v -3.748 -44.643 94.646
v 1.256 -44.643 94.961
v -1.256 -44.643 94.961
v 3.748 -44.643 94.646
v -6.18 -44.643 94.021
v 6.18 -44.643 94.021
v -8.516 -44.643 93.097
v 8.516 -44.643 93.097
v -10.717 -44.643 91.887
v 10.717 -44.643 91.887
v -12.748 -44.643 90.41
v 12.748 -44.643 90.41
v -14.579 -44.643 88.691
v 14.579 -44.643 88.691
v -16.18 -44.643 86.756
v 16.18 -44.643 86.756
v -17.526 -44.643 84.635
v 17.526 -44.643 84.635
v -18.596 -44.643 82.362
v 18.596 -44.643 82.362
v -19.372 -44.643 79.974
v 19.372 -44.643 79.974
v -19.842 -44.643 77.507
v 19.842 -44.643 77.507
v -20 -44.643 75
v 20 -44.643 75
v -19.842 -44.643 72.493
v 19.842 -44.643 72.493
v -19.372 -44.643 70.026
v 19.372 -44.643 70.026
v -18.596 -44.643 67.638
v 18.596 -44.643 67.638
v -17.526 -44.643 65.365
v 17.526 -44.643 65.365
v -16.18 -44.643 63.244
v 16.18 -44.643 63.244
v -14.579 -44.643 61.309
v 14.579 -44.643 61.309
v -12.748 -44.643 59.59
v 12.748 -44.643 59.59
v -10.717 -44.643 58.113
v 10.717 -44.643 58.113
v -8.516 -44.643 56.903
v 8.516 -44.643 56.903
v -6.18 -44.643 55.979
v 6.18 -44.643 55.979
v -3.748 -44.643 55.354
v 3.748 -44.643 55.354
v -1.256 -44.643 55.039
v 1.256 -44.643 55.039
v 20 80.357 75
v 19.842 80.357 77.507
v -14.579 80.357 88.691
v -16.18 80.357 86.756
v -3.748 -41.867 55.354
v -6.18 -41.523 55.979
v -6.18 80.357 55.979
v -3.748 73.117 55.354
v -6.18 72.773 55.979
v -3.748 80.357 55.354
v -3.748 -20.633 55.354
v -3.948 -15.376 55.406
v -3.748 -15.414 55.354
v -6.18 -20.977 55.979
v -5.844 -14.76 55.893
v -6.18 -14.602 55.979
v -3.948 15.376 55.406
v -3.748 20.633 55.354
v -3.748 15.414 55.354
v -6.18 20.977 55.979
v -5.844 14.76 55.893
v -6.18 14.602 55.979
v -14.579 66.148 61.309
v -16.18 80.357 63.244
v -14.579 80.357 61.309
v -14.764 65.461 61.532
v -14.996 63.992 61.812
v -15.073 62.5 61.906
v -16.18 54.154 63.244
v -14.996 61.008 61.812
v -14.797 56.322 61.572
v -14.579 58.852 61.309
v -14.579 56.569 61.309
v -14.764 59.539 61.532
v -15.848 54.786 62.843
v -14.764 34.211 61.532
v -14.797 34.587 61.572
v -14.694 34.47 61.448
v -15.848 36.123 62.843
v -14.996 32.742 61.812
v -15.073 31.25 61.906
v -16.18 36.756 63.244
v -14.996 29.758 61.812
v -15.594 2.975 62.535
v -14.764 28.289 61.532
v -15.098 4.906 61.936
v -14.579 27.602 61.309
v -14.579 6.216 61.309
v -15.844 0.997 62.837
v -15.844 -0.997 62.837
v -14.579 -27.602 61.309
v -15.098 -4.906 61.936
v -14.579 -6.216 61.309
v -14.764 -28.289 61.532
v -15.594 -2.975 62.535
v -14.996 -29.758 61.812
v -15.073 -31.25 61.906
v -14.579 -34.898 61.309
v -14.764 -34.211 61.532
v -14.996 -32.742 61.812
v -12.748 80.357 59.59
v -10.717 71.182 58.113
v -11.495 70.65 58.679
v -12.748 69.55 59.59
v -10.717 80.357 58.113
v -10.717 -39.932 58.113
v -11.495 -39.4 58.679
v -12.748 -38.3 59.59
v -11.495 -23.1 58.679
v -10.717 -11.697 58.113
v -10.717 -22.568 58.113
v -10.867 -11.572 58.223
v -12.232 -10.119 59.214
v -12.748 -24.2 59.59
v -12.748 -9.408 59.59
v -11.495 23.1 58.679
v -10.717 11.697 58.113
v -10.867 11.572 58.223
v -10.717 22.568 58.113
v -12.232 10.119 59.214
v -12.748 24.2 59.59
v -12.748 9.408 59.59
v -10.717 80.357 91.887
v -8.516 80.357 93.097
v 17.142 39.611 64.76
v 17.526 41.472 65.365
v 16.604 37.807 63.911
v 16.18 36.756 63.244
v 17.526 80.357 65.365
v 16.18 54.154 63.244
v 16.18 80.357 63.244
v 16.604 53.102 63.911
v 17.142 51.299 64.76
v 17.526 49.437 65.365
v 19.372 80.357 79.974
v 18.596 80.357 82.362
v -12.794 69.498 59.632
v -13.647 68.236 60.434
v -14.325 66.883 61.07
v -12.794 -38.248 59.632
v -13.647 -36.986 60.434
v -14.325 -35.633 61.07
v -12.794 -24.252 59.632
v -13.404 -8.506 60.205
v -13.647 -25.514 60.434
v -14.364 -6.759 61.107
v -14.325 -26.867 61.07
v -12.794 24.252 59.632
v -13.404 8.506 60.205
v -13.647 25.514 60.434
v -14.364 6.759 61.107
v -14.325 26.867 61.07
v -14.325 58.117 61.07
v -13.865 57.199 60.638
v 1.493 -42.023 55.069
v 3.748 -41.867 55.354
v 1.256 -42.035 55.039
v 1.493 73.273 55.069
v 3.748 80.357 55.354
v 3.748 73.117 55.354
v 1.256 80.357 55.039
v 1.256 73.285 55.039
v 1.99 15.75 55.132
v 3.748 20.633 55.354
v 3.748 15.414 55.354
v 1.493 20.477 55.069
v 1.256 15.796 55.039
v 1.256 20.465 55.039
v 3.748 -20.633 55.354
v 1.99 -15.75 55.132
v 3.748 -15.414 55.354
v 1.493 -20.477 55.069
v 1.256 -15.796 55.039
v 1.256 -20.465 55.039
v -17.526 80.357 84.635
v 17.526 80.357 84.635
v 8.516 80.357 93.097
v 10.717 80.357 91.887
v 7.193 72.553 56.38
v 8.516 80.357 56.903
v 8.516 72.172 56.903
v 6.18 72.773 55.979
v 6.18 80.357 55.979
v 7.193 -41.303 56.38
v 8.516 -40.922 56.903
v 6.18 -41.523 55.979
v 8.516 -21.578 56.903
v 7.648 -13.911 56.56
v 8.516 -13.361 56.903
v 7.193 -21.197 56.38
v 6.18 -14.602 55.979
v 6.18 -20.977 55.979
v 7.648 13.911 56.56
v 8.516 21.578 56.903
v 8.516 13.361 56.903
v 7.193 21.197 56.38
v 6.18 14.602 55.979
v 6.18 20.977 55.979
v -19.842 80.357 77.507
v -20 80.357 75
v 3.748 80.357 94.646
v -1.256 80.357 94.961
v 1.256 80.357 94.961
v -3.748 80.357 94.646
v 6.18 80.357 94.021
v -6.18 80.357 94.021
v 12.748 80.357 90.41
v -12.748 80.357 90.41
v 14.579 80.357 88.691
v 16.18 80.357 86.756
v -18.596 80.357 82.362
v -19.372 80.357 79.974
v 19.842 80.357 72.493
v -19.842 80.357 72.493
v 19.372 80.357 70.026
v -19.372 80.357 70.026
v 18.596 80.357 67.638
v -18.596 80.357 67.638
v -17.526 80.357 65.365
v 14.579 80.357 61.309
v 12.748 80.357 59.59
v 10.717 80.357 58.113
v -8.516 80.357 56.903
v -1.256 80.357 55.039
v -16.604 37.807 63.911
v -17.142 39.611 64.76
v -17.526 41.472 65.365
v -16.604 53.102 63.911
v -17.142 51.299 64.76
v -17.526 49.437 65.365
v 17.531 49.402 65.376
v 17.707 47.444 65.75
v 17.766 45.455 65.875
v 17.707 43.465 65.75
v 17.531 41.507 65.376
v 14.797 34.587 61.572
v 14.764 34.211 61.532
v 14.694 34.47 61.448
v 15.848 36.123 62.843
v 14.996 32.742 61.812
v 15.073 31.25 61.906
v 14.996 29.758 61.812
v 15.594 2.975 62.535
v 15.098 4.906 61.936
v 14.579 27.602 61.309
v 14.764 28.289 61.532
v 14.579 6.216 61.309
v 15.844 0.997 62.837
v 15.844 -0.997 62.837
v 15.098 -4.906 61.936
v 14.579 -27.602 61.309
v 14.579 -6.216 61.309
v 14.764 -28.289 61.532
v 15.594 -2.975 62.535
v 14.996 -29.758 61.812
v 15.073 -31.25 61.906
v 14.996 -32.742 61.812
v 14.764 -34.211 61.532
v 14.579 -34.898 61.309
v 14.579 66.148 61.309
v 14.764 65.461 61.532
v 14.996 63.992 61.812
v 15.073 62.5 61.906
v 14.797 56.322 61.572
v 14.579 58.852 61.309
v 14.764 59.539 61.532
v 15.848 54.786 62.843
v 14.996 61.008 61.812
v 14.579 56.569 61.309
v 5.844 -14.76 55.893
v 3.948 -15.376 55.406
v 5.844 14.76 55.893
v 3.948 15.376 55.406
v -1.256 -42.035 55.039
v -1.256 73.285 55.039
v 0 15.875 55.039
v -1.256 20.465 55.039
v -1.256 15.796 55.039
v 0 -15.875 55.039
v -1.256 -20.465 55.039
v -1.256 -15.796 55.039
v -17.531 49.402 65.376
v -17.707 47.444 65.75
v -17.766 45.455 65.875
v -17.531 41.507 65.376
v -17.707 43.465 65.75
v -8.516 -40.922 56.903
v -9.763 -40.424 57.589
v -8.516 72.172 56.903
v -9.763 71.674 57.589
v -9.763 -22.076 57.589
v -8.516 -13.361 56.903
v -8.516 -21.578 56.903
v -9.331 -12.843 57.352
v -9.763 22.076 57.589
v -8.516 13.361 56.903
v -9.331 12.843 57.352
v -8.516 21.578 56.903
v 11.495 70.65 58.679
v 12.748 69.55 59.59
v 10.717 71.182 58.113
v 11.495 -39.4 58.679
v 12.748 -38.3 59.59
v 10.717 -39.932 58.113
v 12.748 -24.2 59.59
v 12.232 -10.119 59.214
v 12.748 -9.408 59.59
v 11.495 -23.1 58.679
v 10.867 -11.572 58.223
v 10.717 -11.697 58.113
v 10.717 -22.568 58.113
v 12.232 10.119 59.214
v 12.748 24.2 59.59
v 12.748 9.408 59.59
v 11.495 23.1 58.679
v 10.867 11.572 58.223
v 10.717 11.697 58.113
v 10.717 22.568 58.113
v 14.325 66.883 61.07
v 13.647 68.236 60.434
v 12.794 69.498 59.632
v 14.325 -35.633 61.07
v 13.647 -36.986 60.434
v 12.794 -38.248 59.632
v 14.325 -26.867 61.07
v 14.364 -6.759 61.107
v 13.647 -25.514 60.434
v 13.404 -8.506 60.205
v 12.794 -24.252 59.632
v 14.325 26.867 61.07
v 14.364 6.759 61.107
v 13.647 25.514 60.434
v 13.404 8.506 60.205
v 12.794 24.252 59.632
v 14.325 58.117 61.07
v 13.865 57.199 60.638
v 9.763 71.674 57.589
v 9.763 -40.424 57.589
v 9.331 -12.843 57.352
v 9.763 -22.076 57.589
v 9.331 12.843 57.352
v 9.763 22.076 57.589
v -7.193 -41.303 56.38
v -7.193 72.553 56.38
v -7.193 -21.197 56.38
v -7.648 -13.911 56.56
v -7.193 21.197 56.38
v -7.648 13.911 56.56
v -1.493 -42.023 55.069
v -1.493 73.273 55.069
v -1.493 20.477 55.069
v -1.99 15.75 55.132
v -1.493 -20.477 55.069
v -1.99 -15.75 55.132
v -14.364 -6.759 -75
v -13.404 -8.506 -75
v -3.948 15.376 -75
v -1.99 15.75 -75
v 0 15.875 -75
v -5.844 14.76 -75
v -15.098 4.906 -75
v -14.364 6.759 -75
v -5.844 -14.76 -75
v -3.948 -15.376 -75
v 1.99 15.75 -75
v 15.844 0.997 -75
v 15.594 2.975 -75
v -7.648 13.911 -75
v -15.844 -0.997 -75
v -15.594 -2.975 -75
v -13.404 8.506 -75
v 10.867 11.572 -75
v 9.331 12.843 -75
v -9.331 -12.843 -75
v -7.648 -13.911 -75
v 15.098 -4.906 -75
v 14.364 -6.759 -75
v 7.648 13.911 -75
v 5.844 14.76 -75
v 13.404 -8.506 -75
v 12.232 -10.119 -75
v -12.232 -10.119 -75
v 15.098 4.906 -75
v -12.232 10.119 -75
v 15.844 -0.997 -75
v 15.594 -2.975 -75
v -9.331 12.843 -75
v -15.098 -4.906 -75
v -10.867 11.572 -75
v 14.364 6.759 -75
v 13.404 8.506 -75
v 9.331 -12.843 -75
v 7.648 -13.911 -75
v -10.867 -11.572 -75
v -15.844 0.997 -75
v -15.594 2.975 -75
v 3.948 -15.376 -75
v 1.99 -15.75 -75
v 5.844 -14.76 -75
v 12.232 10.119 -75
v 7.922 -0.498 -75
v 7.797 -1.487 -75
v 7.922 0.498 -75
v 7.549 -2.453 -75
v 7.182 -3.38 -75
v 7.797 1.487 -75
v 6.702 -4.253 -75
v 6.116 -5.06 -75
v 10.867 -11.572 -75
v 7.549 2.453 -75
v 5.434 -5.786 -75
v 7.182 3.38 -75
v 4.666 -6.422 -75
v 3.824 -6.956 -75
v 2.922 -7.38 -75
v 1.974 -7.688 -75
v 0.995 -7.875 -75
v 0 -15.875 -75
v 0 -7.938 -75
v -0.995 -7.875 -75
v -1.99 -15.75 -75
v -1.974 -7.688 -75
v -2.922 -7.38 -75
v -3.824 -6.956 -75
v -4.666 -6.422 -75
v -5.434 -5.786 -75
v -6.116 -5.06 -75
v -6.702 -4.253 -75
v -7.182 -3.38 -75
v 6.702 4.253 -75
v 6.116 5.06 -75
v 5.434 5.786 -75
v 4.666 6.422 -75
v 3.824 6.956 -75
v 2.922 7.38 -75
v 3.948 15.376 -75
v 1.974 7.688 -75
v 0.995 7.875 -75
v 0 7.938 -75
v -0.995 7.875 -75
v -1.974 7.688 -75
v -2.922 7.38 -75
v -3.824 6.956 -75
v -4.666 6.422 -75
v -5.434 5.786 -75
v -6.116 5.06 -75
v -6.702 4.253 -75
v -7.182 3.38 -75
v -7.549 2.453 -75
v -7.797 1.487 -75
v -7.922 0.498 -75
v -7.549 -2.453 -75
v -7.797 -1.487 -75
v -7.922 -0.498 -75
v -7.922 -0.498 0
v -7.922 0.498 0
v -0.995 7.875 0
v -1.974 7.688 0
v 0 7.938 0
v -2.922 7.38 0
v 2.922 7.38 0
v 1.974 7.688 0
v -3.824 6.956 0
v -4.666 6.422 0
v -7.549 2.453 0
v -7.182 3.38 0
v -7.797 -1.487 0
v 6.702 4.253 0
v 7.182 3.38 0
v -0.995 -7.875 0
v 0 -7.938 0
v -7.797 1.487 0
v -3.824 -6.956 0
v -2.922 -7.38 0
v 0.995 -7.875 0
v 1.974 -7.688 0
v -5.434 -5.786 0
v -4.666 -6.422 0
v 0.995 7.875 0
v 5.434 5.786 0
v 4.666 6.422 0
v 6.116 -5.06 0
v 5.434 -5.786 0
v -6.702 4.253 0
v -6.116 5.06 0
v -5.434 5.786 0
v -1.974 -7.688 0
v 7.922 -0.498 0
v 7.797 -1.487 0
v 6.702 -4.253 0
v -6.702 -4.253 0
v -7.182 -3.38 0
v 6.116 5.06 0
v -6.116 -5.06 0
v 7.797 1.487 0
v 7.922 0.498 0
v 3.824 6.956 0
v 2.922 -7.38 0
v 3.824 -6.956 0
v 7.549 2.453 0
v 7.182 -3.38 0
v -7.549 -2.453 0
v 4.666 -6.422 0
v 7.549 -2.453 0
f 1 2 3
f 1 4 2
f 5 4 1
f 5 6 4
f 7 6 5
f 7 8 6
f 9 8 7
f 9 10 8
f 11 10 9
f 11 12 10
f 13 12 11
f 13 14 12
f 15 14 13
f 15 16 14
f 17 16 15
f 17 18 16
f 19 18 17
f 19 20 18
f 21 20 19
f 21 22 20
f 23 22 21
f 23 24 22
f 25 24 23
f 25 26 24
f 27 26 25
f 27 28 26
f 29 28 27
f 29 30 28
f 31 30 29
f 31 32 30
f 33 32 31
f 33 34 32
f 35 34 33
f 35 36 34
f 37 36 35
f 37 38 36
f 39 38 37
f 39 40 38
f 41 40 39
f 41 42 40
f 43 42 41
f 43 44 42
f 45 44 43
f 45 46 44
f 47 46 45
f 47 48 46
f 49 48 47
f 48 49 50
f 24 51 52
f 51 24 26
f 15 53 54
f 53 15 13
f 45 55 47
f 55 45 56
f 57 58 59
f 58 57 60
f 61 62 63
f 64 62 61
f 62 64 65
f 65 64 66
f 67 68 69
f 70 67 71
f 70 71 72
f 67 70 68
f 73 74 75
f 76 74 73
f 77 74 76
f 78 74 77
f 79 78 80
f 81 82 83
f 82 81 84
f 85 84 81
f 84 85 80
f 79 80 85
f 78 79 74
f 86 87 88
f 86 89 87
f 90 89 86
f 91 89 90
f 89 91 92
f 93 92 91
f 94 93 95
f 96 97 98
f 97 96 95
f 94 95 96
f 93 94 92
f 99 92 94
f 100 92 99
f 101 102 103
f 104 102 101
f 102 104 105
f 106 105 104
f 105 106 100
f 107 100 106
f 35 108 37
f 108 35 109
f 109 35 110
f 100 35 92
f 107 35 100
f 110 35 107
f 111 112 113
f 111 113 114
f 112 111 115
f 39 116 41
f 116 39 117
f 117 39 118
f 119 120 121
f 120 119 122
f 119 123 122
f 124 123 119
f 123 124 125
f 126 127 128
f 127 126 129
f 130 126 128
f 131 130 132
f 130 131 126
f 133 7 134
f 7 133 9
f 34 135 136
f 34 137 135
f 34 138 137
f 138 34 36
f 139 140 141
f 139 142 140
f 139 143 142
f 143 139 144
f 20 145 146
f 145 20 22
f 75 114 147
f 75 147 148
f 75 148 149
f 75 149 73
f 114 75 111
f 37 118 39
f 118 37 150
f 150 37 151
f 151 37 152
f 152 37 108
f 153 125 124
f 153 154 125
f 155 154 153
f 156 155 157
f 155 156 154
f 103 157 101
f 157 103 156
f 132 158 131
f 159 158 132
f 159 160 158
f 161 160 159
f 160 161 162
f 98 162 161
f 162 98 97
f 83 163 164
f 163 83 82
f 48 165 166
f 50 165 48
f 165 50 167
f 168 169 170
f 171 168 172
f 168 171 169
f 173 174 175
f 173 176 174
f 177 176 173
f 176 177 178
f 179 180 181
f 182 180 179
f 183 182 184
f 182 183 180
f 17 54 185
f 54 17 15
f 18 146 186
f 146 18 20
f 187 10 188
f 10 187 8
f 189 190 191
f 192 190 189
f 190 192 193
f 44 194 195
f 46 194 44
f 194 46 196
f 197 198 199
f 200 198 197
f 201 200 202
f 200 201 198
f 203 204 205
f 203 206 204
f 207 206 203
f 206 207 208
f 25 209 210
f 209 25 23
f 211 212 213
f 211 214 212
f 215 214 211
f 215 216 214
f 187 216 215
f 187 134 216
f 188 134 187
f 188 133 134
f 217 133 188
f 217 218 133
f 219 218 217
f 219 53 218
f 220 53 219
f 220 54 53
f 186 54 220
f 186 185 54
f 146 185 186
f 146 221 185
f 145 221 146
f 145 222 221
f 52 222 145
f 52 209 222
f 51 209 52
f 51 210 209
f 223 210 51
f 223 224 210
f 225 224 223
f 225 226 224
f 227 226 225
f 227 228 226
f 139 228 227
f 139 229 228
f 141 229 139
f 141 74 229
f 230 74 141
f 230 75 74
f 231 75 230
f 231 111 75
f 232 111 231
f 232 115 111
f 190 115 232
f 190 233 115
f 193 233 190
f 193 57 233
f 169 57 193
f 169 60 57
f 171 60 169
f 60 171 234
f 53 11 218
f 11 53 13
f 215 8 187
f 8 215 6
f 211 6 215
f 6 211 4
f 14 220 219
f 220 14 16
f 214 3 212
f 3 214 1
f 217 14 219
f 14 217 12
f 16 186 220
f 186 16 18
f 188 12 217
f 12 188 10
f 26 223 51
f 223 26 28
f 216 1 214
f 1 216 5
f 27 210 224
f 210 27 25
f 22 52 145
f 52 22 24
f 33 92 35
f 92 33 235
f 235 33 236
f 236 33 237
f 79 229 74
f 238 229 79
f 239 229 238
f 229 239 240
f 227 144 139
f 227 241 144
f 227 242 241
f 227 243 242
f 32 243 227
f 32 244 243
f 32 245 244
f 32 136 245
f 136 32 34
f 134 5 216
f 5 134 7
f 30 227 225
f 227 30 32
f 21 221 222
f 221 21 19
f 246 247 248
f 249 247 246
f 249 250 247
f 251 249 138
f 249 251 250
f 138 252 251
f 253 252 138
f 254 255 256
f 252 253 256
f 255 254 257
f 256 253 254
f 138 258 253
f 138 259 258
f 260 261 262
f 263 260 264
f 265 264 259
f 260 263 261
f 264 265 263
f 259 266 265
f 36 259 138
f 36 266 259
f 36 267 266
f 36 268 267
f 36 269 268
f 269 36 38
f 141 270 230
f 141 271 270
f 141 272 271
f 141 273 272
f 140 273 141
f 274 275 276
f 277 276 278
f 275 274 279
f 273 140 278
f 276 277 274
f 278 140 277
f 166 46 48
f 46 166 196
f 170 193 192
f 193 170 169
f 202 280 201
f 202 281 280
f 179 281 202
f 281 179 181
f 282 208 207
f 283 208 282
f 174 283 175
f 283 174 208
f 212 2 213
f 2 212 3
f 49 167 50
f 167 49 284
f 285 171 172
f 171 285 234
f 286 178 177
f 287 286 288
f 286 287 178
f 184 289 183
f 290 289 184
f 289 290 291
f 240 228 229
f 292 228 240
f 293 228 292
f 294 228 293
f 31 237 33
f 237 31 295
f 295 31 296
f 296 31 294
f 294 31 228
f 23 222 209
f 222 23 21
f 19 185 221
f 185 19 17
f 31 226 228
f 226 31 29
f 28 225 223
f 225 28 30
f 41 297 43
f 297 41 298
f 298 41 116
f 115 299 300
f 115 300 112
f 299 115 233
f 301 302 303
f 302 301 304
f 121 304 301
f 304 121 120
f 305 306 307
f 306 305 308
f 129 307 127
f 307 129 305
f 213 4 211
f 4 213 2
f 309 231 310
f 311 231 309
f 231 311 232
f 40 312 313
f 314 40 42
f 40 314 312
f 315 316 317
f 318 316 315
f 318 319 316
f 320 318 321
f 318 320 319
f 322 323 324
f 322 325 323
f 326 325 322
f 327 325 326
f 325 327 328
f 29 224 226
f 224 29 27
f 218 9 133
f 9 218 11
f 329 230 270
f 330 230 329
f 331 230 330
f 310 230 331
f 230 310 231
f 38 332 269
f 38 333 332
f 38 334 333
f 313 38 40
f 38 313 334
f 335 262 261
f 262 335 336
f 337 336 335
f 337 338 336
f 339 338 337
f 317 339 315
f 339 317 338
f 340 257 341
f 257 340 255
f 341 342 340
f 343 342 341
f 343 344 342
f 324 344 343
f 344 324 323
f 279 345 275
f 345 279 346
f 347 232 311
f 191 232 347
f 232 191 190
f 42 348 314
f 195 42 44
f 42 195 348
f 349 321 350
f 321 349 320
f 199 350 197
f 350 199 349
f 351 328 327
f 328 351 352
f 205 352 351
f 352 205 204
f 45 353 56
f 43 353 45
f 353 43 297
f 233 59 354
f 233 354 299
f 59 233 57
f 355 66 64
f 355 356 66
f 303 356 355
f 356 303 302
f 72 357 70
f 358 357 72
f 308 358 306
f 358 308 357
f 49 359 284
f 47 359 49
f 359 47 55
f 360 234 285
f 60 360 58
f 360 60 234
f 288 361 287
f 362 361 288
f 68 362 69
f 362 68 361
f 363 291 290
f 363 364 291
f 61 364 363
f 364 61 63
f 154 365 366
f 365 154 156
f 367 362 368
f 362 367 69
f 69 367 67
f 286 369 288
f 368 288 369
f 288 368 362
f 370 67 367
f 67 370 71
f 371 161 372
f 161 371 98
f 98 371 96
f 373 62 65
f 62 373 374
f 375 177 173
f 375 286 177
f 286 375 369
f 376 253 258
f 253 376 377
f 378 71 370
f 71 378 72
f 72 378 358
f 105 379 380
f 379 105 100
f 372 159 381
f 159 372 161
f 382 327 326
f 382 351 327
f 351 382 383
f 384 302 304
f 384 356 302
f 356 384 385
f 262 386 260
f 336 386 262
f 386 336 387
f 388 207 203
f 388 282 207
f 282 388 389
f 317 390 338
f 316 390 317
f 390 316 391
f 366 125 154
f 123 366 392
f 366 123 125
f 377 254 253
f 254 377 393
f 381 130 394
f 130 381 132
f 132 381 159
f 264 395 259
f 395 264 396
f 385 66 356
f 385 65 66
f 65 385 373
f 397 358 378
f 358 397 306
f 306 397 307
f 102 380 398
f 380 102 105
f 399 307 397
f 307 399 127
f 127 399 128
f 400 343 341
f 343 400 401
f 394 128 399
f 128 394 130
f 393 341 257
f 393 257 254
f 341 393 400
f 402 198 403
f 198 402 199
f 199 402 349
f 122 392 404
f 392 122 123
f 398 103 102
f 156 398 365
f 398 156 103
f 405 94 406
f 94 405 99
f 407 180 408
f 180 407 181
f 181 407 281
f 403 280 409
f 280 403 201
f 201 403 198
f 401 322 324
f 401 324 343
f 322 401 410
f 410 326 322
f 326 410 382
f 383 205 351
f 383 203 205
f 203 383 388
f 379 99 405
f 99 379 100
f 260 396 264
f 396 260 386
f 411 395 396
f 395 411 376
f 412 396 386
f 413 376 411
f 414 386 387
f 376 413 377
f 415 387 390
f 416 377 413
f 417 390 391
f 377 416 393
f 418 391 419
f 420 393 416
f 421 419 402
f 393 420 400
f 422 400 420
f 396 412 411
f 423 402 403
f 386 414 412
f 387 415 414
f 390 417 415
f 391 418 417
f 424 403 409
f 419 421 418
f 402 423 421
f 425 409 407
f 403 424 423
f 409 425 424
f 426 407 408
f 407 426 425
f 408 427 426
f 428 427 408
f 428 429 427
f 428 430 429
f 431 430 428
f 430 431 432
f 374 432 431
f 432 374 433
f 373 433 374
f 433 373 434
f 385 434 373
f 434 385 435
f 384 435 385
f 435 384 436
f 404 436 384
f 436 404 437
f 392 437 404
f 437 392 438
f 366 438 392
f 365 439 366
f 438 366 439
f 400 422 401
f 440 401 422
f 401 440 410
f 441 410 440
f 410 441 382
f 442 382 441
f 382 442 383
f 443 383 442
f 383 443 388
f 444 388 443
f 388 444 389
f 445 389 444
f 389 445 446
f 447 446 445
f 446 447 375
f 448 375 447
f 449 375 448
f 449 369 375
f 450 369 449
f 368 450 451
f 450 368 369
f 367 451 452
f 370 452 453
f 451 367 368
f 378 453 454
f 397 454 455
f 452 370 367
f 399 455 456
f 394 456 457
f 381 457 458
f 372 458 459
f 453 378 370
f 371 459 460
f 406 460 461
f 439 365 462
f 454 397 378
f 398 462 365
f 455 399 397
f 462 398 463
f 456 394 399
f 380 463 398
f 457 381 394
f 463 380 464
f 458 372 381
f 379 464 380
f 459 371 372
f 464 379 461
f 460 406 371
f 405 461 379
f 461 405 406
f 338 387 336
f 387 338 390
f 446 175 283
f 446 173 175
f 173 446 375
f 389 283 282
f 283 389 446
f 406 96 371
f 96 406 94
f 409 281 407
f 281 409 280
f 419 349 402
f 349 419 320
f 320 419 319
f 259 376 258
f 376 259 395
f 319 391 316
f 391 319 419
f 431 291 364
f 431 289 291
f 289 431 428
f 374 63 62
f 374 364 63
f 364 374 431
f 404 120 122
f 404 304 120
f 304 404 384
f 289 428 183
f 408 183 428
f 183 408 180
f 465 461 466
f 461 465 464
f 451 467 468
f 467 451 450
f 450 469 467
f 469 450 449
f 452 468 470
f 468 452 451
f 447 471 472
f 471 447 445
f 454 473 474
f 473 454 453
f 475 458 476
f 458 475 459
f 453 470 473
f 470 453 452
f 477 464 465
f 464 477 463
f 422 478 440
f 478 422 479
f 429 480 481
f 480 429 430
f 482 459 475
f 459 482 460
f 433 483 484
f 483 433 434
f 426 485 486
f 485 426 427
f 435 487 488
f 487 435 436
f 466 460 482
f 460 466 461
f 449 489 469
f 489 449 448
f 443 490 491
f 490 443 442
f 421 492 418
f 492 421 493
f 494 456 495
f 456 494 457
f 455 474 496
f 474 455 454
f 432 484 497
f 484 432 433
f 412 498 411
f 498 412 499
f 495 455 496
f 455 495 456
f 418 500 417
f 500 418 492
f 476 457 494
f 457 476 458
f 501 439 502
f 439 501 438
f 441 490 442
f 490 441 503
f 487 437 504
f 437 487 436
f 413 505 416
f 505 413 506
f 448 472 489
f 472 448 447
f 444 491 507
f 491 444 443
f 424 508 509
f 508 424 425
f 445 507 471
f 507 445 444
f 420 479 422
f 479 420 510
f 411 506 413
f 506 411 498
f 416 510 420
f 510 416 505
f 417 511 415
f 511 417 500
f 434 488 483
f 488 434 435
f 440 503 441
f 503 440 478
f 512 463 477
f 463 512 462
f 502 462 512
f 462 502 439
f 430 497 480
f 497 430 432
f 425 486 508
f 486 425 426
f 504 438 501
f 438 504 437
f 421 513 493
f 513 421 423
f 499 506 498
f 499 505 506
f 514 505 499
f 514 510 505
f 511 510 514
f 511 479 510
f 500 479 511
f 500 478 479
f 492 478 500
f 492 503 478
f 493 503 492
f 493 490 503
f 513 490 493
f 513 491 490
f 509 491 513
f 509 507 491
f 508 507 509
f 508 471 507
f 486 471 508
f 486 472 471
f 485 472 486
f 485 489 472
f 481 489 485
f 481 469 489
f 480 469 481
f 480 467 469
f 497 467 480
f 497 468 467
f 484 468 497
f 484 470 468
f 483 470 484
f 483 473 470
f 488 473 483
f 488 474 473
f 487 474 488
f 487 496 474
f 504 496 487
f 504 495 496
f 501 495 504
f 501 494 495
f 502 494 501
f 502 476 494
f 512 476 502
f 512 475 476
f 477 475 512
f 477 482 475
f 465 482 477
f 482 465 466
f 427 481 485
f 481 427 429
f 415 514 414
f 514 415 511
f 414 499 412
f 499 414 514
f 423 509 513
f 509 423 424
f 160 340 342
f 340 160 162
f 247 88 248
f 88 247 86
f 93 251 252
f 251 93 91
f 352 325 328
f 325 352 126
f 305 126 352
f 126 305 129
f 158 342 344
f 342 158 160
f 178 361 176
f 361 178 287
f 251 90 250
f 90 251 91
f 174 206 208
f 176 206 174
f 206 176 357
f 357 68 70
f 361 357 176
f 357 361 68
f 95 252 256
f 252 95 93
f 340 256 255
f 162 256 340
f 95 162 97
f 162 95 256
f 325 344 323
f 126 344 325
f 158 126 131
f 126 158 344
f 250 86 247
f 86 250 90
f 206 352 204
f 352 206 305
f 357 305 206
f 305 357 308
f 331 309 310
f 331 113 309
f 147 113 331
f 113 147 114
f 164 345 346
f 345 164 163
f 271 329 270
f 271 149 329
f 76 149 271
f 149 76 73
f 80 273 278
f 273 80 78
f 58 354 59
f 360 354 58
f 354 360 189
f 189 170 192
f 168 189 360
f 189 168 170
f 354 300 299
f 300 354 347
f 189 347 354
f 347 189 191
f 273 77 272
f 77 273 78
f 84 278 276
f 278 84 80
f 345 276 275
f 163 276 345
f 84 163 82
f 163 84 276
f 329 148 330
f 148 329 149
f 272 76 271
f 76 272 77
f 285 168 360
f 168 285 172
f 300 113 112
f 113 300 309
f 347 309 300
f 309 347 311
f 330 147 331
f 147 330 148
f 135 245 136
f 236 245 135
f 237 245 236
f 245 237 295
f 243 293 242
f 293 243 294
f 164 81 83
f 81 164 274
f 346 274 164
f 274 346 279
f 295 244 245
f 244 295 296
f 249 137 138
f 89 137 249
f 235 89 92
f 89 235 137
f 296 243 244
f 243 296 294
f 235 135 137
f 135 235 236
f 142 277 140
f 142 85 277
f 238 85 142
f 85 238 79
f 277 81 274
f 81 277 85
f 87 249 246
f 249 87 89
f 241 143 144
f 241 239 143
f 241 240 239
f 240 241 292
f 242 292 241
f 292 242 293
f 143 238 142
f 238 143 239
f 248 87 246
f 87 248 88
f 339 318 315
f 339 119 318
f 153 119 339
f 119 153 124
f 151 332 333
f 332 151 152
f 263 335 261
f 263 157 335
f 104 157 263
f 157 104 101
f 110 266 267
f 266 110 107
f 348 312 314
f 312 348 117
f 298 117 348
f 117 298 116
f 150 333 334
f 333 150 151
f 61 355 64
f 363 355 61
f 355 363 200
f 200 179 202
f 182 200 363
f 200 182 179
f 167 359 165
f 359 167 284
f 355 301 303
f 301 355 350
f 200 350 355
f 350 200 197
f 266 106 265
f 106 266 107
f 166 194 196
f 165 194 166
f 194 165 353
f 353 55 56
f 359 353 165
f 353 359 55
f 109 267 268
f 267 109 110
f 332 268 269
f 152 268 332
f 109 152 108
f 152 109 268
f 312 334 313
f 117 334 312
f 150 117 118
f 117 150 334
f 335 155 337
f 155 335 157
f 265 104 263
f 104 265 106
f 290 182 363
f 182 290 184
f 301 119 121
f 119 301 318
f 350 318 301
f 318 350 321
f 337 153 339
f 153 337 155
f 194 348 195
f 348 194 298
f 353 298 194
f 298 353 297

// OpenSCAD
/*
    Textbox
    variable_name = value;
    Dropdown box
    Numbers
    variable_name = value; // [0,1,2,3,4]
    Text
    variable_name = value; // [yes,no]
    Labeled value
    variable_name = value; // [10:S,20:M,30:L]
    Slider or range
    max only (min is zero)
    variable_name = value; // [40]
    min and max
    variable_name = value; // [1:10]
    min, step, max
    variable_name = value; // [1:0.5:10]
*/

//width of shifter  
width=125;
//diameter of shifter  
diameter=20;
//height of shifter  
height=150;
//shifter thread size  [3/8"=9.525   7/16"=11.1125  1/2"=12.7    9/16"=14.2875 ] 
hole=7.9375;



difference(){
    union(){
        
     translate([0,width/7,height/2]){
           rotate(a=90, v=[1,0,0] , $fn=50){
           cylinder(width,diameter,diameter, center=true);}
           } 
           
           translate([0,0,0]){
           rotate(a=90, v=[0,0,1] , $fn=50){
           cylinder(height,2*hole,2*hole, center=true);}
           } 
           
   
       }         
    
    union(){ 
        
          translate([0,0,-height/2]){
           rotate(a=90, v=[0,0,1] , $fn=50){
           cylinder(height,hole,hole,       center=true);}
           } 
           
           translate([0,width/4,height/3]){
           rotate(a=90, v=[0,1,0] , $fn=50){
           cylinder(height,1.5*hole,1.5*hole, center=true);}
           } 
            
           translate([0,width/2,height/3]){
           rotate(a=90, v=[0,1,0] , $fn=50){
           cylinder(height,1.5*hole,1.5*hole, center=true);}
           } 
           
           translate([0,width/2.75,height/3]){
           rotate(a=90, v=[0,1,0] , $fn=50){
           cylinder(height,2*hole,2*hole, center=true);}
           } 
           
           translate([0,-width/4,height/3]){
           rotate(a=90, v=[0,1,0] , $fn=50){
           cylinder(height,1.5*hole,1.5*hole, center=true);}
           } 
    }
  }
   
